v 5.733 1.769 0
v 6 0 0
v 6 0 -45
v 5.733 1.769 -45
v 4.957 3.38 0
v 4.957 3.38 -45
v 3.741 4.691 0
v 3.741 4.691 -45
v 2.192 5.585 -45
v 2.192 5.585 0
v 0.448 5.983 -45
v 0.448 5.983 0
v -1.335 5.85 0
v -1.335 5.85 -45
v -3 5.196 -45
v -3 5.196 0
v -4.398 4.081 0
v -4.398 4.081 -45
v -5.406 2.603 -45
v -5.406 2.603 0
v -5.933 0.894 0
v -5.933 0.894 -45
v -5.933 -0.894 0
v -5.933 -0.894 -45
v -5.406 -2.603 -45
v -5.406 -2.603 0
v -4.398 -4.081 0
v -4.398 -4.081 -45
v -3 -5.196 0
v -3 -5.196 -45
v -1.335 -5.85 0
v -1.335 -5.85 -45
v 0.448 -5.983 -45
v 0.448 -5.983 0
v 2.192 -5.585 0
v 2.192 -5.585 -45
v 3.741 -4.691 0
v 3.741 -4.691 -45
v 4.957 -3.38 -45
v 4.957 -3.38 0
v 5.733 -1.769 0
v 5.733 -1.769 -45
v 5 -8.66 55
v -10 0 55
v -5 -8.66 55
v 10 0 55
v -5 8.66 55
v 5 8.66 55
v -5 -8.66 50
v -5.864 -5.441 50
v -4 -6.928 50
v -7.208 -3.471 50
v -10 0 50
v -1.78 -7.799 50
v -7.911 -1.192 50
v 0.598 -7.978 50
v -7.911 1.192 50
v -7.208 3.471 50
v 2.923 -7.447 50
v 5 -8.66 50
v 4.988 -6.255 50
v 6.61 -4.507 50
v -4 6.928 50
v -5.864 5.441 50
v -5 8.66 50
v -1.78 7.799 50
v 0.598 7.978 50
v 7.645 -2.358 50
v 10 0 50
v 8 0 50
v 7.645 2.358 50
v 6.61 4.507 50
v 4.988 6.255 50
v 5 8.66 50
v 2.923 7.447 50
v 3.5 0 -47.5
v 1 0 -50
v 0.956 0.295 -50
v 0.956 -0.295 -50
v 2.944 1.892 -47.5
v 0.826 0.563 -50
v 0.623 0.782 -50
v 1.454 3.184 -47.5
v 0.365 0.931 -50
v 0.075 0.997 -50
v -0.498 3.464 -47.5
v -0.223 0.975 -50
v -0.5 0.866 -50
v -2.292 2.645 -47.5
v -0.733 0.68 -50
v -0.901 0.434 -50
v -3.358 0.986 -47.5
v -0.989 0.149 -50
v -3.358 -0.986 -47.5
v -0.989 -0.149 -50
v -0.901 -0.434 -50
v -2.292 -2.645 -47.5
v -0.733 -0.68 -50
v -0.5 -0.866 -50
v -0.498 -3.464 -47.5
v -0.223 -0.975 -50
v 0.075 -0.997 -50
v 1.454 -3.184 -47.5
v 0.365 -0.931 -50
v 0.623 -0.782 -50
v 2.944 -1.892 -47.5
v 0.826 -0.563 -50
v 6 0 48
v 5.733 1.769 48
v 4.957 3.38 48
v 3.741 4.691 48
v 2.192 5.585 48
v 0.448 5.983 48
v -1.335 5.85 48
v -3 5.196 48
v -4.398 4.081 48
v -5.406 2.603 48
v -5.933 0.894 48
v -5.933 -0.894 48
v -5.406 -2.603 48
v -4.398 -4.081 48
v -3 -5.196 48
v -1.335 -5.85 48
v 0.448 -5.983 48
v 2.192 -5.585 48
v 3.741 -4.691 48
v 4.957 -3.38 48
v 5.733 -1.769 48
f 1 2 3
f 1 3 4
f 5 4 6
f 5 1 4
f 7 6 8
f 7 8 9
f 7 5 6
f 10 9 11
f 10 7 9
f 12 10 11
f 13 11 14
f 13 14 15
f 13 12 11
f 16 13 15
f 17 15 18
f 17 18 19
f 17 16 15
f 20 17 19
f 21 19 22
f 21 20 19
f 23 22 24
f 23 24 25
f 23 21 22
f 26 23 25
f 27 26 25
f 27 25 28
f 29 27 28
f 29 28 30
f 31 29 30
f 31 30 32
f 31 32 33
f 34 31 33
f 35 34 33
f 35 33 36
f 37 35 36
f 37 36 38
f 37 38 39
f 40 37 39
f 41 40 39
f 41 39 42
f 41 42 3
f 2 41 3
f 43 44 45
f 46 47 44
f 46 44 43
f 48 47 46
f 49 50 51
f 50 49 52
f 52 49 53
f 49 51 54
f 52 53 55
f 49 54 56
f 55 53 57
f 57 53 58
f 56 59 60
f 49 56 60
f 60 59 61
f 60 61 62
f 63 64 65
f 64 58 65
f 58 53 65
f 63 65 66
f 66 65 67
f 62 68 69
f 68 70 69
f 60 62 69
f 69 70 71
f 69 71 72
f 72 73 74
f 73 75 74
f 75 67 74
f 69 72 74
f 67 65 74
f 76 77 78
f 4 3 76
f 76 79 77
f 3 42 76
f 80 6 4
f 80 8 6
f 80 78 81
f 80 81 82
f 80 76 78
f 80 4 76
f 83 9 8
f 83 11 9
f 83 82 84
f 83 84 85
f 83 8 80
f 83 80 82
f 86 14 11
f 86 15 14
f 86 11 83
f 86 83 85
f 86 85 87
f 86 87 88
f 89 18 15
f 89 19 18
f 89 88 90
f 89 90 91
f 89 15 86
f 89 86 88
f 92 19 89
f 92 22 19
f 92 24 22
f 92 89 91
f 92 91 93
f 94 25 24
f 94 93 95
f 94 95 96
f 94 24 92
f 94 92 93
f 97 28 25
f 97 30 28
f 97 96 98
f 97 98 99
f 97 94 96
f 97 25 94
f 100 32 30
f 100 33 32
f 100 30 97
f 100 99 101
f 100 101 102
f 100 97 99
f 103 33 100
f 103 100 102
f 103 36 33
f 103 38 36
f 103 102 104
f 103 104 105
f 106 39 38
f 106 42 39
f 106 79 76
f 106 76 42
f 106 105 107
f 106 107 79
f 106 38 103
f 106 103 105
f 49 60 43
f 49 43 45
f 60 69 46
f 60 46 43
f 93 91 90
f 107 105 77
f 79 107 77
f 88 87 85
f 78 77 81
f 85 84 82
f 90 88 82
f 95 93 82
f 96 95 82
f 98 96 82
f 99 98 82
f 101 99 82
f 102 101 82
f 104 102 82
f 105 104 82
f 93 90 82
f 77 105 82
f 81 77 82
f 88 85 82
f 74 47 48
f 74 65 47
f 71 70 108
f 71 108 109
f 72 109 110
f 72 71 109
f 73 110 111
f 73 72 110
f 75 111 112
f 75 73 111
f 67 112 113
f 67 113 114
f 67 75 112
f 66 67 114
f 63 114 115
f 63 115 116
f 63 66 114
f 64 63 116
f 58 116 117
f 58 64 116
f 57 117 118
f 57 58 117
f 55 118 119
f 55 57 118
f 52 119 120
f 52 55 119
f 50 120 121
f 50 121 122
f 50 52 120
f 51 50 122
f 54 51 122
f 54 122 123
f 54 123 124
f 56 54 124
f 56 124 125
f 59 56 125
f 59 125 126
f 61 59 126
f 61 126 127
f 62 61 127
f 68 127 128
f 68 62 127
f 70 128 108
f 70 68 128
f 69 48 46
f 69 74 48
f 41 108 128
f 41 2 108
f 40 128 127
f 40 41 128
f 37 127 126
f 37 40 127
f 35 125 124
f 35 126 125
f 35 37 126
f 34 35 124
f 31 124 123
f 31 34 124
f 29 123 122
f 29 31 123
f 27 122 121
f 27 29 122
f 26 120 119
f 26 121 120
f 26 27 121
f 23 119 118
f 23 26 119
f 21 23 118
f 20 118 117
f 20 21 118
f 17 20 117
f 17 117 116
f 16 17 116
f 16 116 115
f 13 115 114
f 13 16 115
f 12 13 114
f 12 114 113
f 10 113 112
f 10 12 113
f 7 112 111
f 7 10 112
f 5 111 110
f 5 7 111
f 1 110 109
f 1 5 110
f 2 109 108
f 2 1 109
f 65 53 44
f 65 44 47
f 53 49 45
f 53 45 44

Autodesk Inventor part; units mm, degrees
sketch "Esboço1" plane through (0, 0, 0) normal (0, 0, 1) x (1, 0, 0)
  circle A0 centre (0, 0) radius 6
  dimension "d0" = 12
extrude "Extrusão1" add sketch "Esboço1" along normal mid plane 100
sketch "Esboço2" plane through (0, 0, 50) normal (0, 0, 1) x (1, 0, 0)
  line L0 (5, 8.6603) -> (10, 0)
  line L1 (10, 0) -> (5, -8.6603)
  line L2 (5, -8.6603) -> (-5, -8.6603)
  line L3 (-5, -8.6603) -> (-10, 0)
  line L4 (-10, 0) -> (-5, 8.6603)
  line L5 (-5, 8.6603) -> (5, 8.6603)
  point P0 (0, 0)
  point P1 (0, 0)
  dimension "d3" = 10
extrude "Extrusão2" add sketch "Esboço2" along normal blind 5
thread "Rosca1" size "M12x1.75" class "6g" standard "ANSI Metric M Profile" length 100
chamfer "Chanfro1" distance 2 angle 45 1 edges at (-6, 0, 50)
chamfer "Chanfro2" distance 5 angle 45 1 edges at (-6, 0, -50)
properties part number "Sessao9__08_04_2025_0002_001" material "Ouro"
